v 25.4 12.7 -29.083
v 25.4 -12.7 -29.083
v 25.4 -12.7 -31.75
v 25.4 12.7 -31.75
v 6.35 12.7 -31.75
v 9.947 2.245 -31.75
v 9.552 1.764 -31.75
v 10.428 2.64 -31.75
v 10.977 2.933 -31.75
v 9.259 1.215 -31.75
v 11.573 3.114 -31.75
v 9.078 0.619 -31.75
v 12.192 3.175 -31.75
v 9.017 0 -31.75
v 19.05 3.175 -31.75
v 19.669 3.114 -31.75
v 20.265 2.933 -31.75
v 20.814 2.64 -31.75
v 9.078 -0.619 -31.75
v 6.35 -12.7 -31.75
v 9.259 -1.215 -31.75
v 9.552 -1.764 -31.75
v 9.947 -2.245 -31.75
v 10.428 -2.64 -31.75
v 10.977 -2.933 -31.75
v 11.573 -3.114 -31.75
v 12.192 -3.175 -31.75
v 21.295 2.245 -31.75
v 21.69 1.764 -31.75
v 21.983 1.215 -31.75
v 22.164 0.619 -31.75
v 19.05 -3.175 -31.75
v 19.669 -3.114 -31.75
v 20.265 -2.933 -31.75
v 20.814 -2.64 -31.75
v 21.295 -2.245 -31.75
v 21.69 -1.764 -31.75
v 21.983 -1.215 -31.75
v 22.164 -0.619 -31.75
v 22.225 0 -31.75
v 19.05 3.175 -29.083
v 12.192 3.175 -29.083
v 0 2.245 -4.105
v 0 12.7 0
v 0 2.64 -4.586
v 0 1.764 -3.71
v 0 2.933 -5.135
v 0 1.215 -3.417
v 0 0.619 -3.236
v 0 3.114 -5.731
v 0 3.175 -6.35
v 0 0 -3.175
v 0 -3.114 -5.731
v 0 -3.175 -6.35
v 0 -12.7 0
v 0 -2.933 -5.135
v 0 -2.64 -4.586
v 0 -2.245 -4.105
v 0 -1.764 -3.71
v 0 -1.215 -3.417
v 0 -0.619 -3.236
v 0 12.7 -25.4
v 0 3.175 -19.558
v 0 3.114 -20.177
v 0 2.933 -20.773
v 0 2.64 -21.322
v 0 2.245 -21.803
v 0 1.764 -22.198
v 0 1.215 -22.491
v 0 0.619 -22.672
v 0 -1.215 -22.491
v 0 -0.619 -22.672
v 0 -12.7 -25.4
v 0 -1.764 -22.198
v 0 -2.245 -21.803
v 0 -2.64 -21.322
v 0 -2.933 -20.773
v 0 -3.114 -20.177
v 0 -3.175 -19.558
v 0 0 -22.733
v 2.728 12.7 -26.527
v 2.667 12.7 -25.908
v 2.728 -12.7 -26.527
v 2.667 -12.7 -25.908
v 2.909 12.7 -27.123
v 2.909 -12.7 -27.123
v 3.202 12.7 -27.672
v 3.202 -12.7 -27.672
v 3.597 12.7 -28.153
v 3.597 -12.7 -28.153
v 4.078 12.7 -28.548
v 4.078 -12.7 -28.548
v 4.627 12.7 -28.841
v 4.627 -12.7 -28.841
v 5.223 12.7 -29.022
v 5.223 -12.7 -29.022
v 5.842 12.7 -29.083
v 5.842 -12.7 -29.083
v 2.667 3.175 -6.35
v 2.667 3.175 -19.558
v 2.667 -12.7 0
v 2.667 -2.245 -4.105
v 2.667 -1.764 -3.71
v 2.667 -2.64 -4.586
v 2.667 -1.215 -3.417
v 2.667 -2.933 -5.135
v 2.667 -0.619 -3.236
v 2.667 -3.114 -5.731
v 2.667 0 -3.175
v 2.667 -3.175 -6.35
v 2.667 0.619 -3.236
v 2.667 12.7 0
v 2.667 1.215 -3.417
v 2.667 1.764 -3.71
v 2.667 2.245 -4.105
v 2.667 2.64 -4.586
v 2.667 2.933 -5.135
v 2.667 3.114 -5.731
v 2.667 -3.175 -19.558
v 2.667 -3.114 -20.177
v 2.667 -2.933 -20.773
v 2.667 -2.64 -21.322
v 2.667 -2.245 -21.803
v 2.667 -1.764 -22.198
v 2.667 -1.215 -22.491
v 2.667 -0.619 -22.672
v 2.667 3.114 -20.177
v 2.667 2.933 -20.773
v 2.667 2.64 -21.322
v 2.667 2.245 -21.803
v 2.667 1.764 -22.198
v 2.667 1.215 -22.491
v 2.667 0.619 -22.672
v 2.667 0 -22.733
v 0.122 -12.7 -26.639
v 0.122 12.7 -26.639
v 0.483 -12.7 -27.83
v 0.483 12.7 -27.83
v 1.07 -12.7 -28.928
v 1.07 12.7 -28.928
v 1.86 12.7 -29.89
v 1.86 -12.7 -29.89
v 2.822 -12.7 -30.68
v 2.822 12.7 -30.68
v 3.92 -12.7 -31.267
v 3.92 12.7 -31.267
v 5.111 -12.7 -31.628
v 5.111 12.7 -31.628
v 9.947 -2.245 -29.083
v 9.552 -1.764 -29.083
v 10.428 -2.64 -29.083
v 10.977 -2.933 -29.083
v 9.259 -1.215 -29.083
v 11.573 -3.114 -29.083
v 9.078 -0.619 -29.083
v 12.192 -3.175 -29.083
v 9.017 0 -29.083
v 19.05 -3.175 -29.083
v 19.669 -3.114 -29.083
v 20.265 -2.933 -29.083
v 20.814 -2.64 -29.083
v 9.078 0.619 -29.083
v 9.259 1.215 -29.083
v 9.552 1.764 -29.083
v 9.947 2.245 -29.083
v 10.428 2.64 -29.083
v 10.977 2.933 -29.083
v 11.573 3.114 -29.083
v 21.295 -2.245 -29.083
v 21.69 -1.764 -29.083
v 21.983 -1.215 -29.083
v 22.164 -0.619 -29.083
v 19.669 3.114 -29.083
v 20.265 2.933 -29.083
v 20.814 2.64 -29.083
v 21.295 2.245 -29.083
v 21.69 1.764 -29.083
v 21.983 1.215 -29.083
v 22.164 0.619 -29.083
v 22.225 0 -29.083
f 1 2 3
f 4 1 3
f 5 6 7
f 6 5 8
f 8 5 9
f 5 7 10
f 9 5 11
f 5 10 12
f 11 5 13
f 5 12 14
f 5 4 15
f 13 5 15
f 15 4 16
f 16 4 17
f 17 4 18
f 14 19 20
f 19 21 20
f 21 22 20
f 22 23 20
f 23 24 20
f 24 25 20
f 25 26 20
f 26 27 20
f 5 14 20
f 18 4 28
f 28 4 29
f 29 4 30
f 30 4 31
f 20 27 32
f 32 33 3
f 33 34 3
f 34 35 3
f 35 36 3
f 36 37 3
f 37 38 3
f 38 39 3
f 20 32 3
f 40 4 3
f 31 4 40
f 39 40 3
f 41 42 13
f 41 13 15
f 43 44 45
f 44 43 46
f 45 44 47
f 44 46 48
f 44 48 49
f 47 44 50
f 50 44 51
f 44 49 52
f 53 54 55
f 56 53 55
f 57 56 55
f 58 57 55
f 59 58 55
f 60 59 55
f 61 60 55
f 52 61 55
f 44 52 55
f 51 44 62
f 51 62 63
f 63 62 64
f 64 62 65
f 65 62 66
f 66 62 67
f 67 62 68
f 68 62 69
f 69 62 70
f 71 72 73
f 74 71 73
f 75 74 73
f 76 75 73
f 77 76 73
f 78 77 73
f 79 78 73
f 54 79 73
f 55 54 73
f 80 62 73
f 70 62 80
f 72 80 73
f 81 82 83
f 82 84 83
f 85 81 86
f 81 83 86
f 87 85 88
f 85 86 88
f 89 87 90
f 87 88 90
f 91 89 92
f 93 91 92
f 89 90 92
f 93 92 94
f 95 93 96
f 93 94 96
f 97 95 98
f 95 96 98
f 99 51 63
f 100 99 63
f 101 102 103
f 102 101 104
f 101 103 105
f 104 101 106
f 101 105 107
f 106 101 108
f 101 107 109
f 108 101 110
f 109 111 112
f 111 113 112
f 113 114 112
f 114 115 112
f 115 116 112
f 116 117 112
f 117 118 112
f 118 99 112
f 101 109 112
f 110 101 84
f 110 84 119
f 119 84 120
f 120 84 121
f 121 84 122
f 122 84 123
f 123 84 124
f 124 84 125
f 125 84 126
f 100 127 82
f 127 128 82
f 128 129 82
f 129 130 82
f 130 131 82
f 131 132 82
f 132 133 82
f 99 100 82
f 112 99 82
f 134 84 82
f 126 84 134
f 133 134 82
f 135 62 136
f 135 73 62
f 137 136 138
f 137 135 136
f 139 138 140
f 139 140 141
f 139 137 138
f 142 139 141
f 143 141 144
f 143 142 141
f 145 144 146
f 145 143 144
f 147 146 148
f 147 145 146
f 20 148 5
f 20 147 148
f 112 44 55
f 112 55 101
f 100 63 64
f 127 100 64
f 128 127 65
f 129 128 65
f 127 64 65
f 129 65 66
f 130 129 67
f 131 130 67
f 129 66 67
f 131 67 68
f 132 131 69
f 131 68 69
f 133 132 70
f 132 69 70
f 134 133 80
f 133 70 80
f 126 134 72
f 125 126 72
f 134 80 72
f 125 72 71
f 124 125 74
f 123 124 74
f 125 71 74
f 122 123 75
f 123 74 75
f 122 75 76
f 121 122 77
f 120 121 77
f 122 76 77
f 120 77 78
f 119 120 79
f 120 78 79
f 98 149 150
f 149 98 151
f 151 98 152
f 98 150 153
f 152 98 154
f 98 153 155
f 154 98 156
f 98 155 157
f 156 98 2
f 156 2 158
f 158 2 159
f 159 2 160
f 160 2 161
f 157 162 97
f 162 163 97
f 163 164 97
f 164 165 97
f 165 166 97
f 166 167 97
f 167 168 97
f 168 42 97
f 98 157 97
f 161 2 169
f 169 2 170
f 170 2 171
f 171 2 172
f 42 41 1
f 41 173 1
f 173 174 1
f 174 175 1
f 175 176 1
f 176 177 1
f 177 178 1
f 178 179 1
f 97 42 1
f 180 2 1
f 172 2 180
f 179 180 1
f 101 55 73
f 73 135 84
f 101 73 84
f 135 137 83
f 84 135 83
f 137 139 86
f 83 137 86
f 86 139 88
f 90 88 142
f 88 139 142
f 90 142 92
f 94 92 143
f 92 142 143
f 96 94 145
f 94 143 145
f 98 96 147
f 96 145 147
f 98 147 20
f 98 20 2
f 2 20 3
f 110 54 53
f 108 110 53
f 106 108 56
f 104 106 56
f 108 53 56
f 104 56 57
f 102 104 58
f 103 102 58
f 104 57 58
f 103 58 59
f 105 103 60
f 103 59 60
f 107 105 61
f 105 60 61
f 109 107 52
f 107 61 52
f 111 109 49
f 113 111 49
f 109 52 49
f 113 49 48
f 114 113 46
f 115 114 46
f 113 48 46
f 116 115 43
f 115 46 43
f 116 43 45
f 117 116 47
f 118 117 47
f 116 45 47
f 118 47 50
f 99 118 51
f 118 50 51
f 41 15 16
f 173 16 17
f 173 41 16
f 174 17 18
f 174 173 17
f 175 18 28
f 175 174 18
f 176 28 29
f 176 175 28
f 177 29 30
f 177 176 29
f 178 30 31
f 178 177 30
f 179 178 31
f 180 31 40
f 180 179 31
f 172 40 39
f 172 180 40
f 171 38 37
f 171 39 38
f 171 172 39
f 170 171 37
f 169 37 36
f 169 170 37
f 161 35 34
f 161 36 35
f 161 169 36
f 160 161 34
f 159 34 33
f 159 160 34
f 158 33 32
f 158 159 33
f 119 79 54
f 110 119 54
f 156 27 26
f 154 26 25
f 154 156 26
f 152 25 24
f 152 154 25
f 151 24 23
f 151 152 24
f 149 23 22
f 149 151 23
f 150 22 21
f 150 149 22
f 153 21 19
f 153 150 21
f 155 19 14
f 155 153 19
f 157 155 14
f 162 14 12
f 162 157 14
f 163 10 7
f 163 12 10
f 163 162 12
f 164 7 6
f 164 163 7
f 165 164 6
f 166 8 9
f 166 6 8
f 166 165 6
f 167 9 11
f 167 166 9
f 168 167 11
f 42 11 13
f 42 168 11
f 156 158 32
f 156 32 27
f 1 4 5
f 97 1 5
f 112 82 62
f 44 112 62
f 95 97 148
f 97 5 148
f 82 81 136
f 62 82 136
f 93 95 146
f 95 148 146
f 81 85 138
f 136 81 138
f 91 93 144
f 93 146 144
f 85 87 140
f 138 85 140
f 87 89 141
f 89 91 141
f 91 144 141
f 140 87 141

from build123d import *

# Parameters (mm, degrees)
SKETCH3_W          = 2.667
SKETCH3_H          = 25.4
FILLET1_R          = 3.175
FILLET2_R          = 6.35
CUT_EXTRUDE2_REACH = 27.4
CUT_EXTRUDE3_DEPTH = 3.667


with BuildPart() as part:
    # Sweep1: sweep along a path in Sketch4
    with BuildLine(Plane(origin=(0, 0, 0), x_dir=(1, 0, 0), z_dir=(0, 1, 0))) as sweep1_path:
        Line((0, 0), (0, 31.75))
        Line((0, 31.75), (25.4, 31.75))
    # Sketch3 → Sweep1 (sweep)
    with BuildSketch(Plane.XY):
        with Locations((1.3335, 0)):
            Rectangle(SKETCH3_W, SKETCH3_H)
    sweep(path=sweep1_path.line, transition=Transition.RIGHT)

    # Fillet1
    fillet1_edges = [part.edges().sort_by_distance(p)[0] for p in [
        (2.667, 0, -29.083),
    ]]
    fillet(fillet1_edges, radius=FILLET1_R)

    # Fillet2
    fillet2_edges = [part.edges().sort_by_distance(p)[0] for p in [
        (0, 0, -31.75),
    ]]
    fillet(fillet2_edges, radius=FILLET2_R)

    # Sketch6 → Cut-Extrude2 (cut, up to next)
    with BuildSketch(Plane(origin=(0, 0, 0), x_dir=(0, 0, -1), z_dir=(1, 0, 0)), mode=Mode.PRIVATE) as cut_extrude2_sk1:
        with BuildLine():
            Line((19.558, -3.175), (6.35, -3.175))
            ThreePointArc((6.35, -3.175), (3.175, 0), (6.35, 3.175))
            Line((6.35, 3.175), (19.558, 3.175))
            ThreePointArc((19.558, 3.175), (22.733, 0), (19.558, -3.175))
        make_face()
    cut_extrude2_tool1 = extrude(cut_extrude2_sk1.sketch, amount=CUT_EXTRUDE2_REACH, mode=Mode.PRIVATE) & part.part
    add(cut_extrude2_tool1.solids().sort_by_distance((0, 0, -12.954))[0], mode=Mode.SUBTRACT)

    # Sketch7 → Cut-Extrude3 (cut, through all)
    with BuildSketch(Plane.XY.offset(-29.083)):
        with BuildLine():
            Line((12.192, 3.175), (19.05, 3.175))
            ThreePointArc((19.05, 3.175), (22.225, 0), (19.05, -3.175))
            Line((19.05, -3.175), (12.192, -3.175))
            ThreePointArc((12.192, -3.175), (9.017, 0), (12.192, 3.175))
        make_face()
    extrude(amount=-CUT_EXTRUDE3_DEPTH, mode=Mode.SUBTRACT)


solid = part.part
